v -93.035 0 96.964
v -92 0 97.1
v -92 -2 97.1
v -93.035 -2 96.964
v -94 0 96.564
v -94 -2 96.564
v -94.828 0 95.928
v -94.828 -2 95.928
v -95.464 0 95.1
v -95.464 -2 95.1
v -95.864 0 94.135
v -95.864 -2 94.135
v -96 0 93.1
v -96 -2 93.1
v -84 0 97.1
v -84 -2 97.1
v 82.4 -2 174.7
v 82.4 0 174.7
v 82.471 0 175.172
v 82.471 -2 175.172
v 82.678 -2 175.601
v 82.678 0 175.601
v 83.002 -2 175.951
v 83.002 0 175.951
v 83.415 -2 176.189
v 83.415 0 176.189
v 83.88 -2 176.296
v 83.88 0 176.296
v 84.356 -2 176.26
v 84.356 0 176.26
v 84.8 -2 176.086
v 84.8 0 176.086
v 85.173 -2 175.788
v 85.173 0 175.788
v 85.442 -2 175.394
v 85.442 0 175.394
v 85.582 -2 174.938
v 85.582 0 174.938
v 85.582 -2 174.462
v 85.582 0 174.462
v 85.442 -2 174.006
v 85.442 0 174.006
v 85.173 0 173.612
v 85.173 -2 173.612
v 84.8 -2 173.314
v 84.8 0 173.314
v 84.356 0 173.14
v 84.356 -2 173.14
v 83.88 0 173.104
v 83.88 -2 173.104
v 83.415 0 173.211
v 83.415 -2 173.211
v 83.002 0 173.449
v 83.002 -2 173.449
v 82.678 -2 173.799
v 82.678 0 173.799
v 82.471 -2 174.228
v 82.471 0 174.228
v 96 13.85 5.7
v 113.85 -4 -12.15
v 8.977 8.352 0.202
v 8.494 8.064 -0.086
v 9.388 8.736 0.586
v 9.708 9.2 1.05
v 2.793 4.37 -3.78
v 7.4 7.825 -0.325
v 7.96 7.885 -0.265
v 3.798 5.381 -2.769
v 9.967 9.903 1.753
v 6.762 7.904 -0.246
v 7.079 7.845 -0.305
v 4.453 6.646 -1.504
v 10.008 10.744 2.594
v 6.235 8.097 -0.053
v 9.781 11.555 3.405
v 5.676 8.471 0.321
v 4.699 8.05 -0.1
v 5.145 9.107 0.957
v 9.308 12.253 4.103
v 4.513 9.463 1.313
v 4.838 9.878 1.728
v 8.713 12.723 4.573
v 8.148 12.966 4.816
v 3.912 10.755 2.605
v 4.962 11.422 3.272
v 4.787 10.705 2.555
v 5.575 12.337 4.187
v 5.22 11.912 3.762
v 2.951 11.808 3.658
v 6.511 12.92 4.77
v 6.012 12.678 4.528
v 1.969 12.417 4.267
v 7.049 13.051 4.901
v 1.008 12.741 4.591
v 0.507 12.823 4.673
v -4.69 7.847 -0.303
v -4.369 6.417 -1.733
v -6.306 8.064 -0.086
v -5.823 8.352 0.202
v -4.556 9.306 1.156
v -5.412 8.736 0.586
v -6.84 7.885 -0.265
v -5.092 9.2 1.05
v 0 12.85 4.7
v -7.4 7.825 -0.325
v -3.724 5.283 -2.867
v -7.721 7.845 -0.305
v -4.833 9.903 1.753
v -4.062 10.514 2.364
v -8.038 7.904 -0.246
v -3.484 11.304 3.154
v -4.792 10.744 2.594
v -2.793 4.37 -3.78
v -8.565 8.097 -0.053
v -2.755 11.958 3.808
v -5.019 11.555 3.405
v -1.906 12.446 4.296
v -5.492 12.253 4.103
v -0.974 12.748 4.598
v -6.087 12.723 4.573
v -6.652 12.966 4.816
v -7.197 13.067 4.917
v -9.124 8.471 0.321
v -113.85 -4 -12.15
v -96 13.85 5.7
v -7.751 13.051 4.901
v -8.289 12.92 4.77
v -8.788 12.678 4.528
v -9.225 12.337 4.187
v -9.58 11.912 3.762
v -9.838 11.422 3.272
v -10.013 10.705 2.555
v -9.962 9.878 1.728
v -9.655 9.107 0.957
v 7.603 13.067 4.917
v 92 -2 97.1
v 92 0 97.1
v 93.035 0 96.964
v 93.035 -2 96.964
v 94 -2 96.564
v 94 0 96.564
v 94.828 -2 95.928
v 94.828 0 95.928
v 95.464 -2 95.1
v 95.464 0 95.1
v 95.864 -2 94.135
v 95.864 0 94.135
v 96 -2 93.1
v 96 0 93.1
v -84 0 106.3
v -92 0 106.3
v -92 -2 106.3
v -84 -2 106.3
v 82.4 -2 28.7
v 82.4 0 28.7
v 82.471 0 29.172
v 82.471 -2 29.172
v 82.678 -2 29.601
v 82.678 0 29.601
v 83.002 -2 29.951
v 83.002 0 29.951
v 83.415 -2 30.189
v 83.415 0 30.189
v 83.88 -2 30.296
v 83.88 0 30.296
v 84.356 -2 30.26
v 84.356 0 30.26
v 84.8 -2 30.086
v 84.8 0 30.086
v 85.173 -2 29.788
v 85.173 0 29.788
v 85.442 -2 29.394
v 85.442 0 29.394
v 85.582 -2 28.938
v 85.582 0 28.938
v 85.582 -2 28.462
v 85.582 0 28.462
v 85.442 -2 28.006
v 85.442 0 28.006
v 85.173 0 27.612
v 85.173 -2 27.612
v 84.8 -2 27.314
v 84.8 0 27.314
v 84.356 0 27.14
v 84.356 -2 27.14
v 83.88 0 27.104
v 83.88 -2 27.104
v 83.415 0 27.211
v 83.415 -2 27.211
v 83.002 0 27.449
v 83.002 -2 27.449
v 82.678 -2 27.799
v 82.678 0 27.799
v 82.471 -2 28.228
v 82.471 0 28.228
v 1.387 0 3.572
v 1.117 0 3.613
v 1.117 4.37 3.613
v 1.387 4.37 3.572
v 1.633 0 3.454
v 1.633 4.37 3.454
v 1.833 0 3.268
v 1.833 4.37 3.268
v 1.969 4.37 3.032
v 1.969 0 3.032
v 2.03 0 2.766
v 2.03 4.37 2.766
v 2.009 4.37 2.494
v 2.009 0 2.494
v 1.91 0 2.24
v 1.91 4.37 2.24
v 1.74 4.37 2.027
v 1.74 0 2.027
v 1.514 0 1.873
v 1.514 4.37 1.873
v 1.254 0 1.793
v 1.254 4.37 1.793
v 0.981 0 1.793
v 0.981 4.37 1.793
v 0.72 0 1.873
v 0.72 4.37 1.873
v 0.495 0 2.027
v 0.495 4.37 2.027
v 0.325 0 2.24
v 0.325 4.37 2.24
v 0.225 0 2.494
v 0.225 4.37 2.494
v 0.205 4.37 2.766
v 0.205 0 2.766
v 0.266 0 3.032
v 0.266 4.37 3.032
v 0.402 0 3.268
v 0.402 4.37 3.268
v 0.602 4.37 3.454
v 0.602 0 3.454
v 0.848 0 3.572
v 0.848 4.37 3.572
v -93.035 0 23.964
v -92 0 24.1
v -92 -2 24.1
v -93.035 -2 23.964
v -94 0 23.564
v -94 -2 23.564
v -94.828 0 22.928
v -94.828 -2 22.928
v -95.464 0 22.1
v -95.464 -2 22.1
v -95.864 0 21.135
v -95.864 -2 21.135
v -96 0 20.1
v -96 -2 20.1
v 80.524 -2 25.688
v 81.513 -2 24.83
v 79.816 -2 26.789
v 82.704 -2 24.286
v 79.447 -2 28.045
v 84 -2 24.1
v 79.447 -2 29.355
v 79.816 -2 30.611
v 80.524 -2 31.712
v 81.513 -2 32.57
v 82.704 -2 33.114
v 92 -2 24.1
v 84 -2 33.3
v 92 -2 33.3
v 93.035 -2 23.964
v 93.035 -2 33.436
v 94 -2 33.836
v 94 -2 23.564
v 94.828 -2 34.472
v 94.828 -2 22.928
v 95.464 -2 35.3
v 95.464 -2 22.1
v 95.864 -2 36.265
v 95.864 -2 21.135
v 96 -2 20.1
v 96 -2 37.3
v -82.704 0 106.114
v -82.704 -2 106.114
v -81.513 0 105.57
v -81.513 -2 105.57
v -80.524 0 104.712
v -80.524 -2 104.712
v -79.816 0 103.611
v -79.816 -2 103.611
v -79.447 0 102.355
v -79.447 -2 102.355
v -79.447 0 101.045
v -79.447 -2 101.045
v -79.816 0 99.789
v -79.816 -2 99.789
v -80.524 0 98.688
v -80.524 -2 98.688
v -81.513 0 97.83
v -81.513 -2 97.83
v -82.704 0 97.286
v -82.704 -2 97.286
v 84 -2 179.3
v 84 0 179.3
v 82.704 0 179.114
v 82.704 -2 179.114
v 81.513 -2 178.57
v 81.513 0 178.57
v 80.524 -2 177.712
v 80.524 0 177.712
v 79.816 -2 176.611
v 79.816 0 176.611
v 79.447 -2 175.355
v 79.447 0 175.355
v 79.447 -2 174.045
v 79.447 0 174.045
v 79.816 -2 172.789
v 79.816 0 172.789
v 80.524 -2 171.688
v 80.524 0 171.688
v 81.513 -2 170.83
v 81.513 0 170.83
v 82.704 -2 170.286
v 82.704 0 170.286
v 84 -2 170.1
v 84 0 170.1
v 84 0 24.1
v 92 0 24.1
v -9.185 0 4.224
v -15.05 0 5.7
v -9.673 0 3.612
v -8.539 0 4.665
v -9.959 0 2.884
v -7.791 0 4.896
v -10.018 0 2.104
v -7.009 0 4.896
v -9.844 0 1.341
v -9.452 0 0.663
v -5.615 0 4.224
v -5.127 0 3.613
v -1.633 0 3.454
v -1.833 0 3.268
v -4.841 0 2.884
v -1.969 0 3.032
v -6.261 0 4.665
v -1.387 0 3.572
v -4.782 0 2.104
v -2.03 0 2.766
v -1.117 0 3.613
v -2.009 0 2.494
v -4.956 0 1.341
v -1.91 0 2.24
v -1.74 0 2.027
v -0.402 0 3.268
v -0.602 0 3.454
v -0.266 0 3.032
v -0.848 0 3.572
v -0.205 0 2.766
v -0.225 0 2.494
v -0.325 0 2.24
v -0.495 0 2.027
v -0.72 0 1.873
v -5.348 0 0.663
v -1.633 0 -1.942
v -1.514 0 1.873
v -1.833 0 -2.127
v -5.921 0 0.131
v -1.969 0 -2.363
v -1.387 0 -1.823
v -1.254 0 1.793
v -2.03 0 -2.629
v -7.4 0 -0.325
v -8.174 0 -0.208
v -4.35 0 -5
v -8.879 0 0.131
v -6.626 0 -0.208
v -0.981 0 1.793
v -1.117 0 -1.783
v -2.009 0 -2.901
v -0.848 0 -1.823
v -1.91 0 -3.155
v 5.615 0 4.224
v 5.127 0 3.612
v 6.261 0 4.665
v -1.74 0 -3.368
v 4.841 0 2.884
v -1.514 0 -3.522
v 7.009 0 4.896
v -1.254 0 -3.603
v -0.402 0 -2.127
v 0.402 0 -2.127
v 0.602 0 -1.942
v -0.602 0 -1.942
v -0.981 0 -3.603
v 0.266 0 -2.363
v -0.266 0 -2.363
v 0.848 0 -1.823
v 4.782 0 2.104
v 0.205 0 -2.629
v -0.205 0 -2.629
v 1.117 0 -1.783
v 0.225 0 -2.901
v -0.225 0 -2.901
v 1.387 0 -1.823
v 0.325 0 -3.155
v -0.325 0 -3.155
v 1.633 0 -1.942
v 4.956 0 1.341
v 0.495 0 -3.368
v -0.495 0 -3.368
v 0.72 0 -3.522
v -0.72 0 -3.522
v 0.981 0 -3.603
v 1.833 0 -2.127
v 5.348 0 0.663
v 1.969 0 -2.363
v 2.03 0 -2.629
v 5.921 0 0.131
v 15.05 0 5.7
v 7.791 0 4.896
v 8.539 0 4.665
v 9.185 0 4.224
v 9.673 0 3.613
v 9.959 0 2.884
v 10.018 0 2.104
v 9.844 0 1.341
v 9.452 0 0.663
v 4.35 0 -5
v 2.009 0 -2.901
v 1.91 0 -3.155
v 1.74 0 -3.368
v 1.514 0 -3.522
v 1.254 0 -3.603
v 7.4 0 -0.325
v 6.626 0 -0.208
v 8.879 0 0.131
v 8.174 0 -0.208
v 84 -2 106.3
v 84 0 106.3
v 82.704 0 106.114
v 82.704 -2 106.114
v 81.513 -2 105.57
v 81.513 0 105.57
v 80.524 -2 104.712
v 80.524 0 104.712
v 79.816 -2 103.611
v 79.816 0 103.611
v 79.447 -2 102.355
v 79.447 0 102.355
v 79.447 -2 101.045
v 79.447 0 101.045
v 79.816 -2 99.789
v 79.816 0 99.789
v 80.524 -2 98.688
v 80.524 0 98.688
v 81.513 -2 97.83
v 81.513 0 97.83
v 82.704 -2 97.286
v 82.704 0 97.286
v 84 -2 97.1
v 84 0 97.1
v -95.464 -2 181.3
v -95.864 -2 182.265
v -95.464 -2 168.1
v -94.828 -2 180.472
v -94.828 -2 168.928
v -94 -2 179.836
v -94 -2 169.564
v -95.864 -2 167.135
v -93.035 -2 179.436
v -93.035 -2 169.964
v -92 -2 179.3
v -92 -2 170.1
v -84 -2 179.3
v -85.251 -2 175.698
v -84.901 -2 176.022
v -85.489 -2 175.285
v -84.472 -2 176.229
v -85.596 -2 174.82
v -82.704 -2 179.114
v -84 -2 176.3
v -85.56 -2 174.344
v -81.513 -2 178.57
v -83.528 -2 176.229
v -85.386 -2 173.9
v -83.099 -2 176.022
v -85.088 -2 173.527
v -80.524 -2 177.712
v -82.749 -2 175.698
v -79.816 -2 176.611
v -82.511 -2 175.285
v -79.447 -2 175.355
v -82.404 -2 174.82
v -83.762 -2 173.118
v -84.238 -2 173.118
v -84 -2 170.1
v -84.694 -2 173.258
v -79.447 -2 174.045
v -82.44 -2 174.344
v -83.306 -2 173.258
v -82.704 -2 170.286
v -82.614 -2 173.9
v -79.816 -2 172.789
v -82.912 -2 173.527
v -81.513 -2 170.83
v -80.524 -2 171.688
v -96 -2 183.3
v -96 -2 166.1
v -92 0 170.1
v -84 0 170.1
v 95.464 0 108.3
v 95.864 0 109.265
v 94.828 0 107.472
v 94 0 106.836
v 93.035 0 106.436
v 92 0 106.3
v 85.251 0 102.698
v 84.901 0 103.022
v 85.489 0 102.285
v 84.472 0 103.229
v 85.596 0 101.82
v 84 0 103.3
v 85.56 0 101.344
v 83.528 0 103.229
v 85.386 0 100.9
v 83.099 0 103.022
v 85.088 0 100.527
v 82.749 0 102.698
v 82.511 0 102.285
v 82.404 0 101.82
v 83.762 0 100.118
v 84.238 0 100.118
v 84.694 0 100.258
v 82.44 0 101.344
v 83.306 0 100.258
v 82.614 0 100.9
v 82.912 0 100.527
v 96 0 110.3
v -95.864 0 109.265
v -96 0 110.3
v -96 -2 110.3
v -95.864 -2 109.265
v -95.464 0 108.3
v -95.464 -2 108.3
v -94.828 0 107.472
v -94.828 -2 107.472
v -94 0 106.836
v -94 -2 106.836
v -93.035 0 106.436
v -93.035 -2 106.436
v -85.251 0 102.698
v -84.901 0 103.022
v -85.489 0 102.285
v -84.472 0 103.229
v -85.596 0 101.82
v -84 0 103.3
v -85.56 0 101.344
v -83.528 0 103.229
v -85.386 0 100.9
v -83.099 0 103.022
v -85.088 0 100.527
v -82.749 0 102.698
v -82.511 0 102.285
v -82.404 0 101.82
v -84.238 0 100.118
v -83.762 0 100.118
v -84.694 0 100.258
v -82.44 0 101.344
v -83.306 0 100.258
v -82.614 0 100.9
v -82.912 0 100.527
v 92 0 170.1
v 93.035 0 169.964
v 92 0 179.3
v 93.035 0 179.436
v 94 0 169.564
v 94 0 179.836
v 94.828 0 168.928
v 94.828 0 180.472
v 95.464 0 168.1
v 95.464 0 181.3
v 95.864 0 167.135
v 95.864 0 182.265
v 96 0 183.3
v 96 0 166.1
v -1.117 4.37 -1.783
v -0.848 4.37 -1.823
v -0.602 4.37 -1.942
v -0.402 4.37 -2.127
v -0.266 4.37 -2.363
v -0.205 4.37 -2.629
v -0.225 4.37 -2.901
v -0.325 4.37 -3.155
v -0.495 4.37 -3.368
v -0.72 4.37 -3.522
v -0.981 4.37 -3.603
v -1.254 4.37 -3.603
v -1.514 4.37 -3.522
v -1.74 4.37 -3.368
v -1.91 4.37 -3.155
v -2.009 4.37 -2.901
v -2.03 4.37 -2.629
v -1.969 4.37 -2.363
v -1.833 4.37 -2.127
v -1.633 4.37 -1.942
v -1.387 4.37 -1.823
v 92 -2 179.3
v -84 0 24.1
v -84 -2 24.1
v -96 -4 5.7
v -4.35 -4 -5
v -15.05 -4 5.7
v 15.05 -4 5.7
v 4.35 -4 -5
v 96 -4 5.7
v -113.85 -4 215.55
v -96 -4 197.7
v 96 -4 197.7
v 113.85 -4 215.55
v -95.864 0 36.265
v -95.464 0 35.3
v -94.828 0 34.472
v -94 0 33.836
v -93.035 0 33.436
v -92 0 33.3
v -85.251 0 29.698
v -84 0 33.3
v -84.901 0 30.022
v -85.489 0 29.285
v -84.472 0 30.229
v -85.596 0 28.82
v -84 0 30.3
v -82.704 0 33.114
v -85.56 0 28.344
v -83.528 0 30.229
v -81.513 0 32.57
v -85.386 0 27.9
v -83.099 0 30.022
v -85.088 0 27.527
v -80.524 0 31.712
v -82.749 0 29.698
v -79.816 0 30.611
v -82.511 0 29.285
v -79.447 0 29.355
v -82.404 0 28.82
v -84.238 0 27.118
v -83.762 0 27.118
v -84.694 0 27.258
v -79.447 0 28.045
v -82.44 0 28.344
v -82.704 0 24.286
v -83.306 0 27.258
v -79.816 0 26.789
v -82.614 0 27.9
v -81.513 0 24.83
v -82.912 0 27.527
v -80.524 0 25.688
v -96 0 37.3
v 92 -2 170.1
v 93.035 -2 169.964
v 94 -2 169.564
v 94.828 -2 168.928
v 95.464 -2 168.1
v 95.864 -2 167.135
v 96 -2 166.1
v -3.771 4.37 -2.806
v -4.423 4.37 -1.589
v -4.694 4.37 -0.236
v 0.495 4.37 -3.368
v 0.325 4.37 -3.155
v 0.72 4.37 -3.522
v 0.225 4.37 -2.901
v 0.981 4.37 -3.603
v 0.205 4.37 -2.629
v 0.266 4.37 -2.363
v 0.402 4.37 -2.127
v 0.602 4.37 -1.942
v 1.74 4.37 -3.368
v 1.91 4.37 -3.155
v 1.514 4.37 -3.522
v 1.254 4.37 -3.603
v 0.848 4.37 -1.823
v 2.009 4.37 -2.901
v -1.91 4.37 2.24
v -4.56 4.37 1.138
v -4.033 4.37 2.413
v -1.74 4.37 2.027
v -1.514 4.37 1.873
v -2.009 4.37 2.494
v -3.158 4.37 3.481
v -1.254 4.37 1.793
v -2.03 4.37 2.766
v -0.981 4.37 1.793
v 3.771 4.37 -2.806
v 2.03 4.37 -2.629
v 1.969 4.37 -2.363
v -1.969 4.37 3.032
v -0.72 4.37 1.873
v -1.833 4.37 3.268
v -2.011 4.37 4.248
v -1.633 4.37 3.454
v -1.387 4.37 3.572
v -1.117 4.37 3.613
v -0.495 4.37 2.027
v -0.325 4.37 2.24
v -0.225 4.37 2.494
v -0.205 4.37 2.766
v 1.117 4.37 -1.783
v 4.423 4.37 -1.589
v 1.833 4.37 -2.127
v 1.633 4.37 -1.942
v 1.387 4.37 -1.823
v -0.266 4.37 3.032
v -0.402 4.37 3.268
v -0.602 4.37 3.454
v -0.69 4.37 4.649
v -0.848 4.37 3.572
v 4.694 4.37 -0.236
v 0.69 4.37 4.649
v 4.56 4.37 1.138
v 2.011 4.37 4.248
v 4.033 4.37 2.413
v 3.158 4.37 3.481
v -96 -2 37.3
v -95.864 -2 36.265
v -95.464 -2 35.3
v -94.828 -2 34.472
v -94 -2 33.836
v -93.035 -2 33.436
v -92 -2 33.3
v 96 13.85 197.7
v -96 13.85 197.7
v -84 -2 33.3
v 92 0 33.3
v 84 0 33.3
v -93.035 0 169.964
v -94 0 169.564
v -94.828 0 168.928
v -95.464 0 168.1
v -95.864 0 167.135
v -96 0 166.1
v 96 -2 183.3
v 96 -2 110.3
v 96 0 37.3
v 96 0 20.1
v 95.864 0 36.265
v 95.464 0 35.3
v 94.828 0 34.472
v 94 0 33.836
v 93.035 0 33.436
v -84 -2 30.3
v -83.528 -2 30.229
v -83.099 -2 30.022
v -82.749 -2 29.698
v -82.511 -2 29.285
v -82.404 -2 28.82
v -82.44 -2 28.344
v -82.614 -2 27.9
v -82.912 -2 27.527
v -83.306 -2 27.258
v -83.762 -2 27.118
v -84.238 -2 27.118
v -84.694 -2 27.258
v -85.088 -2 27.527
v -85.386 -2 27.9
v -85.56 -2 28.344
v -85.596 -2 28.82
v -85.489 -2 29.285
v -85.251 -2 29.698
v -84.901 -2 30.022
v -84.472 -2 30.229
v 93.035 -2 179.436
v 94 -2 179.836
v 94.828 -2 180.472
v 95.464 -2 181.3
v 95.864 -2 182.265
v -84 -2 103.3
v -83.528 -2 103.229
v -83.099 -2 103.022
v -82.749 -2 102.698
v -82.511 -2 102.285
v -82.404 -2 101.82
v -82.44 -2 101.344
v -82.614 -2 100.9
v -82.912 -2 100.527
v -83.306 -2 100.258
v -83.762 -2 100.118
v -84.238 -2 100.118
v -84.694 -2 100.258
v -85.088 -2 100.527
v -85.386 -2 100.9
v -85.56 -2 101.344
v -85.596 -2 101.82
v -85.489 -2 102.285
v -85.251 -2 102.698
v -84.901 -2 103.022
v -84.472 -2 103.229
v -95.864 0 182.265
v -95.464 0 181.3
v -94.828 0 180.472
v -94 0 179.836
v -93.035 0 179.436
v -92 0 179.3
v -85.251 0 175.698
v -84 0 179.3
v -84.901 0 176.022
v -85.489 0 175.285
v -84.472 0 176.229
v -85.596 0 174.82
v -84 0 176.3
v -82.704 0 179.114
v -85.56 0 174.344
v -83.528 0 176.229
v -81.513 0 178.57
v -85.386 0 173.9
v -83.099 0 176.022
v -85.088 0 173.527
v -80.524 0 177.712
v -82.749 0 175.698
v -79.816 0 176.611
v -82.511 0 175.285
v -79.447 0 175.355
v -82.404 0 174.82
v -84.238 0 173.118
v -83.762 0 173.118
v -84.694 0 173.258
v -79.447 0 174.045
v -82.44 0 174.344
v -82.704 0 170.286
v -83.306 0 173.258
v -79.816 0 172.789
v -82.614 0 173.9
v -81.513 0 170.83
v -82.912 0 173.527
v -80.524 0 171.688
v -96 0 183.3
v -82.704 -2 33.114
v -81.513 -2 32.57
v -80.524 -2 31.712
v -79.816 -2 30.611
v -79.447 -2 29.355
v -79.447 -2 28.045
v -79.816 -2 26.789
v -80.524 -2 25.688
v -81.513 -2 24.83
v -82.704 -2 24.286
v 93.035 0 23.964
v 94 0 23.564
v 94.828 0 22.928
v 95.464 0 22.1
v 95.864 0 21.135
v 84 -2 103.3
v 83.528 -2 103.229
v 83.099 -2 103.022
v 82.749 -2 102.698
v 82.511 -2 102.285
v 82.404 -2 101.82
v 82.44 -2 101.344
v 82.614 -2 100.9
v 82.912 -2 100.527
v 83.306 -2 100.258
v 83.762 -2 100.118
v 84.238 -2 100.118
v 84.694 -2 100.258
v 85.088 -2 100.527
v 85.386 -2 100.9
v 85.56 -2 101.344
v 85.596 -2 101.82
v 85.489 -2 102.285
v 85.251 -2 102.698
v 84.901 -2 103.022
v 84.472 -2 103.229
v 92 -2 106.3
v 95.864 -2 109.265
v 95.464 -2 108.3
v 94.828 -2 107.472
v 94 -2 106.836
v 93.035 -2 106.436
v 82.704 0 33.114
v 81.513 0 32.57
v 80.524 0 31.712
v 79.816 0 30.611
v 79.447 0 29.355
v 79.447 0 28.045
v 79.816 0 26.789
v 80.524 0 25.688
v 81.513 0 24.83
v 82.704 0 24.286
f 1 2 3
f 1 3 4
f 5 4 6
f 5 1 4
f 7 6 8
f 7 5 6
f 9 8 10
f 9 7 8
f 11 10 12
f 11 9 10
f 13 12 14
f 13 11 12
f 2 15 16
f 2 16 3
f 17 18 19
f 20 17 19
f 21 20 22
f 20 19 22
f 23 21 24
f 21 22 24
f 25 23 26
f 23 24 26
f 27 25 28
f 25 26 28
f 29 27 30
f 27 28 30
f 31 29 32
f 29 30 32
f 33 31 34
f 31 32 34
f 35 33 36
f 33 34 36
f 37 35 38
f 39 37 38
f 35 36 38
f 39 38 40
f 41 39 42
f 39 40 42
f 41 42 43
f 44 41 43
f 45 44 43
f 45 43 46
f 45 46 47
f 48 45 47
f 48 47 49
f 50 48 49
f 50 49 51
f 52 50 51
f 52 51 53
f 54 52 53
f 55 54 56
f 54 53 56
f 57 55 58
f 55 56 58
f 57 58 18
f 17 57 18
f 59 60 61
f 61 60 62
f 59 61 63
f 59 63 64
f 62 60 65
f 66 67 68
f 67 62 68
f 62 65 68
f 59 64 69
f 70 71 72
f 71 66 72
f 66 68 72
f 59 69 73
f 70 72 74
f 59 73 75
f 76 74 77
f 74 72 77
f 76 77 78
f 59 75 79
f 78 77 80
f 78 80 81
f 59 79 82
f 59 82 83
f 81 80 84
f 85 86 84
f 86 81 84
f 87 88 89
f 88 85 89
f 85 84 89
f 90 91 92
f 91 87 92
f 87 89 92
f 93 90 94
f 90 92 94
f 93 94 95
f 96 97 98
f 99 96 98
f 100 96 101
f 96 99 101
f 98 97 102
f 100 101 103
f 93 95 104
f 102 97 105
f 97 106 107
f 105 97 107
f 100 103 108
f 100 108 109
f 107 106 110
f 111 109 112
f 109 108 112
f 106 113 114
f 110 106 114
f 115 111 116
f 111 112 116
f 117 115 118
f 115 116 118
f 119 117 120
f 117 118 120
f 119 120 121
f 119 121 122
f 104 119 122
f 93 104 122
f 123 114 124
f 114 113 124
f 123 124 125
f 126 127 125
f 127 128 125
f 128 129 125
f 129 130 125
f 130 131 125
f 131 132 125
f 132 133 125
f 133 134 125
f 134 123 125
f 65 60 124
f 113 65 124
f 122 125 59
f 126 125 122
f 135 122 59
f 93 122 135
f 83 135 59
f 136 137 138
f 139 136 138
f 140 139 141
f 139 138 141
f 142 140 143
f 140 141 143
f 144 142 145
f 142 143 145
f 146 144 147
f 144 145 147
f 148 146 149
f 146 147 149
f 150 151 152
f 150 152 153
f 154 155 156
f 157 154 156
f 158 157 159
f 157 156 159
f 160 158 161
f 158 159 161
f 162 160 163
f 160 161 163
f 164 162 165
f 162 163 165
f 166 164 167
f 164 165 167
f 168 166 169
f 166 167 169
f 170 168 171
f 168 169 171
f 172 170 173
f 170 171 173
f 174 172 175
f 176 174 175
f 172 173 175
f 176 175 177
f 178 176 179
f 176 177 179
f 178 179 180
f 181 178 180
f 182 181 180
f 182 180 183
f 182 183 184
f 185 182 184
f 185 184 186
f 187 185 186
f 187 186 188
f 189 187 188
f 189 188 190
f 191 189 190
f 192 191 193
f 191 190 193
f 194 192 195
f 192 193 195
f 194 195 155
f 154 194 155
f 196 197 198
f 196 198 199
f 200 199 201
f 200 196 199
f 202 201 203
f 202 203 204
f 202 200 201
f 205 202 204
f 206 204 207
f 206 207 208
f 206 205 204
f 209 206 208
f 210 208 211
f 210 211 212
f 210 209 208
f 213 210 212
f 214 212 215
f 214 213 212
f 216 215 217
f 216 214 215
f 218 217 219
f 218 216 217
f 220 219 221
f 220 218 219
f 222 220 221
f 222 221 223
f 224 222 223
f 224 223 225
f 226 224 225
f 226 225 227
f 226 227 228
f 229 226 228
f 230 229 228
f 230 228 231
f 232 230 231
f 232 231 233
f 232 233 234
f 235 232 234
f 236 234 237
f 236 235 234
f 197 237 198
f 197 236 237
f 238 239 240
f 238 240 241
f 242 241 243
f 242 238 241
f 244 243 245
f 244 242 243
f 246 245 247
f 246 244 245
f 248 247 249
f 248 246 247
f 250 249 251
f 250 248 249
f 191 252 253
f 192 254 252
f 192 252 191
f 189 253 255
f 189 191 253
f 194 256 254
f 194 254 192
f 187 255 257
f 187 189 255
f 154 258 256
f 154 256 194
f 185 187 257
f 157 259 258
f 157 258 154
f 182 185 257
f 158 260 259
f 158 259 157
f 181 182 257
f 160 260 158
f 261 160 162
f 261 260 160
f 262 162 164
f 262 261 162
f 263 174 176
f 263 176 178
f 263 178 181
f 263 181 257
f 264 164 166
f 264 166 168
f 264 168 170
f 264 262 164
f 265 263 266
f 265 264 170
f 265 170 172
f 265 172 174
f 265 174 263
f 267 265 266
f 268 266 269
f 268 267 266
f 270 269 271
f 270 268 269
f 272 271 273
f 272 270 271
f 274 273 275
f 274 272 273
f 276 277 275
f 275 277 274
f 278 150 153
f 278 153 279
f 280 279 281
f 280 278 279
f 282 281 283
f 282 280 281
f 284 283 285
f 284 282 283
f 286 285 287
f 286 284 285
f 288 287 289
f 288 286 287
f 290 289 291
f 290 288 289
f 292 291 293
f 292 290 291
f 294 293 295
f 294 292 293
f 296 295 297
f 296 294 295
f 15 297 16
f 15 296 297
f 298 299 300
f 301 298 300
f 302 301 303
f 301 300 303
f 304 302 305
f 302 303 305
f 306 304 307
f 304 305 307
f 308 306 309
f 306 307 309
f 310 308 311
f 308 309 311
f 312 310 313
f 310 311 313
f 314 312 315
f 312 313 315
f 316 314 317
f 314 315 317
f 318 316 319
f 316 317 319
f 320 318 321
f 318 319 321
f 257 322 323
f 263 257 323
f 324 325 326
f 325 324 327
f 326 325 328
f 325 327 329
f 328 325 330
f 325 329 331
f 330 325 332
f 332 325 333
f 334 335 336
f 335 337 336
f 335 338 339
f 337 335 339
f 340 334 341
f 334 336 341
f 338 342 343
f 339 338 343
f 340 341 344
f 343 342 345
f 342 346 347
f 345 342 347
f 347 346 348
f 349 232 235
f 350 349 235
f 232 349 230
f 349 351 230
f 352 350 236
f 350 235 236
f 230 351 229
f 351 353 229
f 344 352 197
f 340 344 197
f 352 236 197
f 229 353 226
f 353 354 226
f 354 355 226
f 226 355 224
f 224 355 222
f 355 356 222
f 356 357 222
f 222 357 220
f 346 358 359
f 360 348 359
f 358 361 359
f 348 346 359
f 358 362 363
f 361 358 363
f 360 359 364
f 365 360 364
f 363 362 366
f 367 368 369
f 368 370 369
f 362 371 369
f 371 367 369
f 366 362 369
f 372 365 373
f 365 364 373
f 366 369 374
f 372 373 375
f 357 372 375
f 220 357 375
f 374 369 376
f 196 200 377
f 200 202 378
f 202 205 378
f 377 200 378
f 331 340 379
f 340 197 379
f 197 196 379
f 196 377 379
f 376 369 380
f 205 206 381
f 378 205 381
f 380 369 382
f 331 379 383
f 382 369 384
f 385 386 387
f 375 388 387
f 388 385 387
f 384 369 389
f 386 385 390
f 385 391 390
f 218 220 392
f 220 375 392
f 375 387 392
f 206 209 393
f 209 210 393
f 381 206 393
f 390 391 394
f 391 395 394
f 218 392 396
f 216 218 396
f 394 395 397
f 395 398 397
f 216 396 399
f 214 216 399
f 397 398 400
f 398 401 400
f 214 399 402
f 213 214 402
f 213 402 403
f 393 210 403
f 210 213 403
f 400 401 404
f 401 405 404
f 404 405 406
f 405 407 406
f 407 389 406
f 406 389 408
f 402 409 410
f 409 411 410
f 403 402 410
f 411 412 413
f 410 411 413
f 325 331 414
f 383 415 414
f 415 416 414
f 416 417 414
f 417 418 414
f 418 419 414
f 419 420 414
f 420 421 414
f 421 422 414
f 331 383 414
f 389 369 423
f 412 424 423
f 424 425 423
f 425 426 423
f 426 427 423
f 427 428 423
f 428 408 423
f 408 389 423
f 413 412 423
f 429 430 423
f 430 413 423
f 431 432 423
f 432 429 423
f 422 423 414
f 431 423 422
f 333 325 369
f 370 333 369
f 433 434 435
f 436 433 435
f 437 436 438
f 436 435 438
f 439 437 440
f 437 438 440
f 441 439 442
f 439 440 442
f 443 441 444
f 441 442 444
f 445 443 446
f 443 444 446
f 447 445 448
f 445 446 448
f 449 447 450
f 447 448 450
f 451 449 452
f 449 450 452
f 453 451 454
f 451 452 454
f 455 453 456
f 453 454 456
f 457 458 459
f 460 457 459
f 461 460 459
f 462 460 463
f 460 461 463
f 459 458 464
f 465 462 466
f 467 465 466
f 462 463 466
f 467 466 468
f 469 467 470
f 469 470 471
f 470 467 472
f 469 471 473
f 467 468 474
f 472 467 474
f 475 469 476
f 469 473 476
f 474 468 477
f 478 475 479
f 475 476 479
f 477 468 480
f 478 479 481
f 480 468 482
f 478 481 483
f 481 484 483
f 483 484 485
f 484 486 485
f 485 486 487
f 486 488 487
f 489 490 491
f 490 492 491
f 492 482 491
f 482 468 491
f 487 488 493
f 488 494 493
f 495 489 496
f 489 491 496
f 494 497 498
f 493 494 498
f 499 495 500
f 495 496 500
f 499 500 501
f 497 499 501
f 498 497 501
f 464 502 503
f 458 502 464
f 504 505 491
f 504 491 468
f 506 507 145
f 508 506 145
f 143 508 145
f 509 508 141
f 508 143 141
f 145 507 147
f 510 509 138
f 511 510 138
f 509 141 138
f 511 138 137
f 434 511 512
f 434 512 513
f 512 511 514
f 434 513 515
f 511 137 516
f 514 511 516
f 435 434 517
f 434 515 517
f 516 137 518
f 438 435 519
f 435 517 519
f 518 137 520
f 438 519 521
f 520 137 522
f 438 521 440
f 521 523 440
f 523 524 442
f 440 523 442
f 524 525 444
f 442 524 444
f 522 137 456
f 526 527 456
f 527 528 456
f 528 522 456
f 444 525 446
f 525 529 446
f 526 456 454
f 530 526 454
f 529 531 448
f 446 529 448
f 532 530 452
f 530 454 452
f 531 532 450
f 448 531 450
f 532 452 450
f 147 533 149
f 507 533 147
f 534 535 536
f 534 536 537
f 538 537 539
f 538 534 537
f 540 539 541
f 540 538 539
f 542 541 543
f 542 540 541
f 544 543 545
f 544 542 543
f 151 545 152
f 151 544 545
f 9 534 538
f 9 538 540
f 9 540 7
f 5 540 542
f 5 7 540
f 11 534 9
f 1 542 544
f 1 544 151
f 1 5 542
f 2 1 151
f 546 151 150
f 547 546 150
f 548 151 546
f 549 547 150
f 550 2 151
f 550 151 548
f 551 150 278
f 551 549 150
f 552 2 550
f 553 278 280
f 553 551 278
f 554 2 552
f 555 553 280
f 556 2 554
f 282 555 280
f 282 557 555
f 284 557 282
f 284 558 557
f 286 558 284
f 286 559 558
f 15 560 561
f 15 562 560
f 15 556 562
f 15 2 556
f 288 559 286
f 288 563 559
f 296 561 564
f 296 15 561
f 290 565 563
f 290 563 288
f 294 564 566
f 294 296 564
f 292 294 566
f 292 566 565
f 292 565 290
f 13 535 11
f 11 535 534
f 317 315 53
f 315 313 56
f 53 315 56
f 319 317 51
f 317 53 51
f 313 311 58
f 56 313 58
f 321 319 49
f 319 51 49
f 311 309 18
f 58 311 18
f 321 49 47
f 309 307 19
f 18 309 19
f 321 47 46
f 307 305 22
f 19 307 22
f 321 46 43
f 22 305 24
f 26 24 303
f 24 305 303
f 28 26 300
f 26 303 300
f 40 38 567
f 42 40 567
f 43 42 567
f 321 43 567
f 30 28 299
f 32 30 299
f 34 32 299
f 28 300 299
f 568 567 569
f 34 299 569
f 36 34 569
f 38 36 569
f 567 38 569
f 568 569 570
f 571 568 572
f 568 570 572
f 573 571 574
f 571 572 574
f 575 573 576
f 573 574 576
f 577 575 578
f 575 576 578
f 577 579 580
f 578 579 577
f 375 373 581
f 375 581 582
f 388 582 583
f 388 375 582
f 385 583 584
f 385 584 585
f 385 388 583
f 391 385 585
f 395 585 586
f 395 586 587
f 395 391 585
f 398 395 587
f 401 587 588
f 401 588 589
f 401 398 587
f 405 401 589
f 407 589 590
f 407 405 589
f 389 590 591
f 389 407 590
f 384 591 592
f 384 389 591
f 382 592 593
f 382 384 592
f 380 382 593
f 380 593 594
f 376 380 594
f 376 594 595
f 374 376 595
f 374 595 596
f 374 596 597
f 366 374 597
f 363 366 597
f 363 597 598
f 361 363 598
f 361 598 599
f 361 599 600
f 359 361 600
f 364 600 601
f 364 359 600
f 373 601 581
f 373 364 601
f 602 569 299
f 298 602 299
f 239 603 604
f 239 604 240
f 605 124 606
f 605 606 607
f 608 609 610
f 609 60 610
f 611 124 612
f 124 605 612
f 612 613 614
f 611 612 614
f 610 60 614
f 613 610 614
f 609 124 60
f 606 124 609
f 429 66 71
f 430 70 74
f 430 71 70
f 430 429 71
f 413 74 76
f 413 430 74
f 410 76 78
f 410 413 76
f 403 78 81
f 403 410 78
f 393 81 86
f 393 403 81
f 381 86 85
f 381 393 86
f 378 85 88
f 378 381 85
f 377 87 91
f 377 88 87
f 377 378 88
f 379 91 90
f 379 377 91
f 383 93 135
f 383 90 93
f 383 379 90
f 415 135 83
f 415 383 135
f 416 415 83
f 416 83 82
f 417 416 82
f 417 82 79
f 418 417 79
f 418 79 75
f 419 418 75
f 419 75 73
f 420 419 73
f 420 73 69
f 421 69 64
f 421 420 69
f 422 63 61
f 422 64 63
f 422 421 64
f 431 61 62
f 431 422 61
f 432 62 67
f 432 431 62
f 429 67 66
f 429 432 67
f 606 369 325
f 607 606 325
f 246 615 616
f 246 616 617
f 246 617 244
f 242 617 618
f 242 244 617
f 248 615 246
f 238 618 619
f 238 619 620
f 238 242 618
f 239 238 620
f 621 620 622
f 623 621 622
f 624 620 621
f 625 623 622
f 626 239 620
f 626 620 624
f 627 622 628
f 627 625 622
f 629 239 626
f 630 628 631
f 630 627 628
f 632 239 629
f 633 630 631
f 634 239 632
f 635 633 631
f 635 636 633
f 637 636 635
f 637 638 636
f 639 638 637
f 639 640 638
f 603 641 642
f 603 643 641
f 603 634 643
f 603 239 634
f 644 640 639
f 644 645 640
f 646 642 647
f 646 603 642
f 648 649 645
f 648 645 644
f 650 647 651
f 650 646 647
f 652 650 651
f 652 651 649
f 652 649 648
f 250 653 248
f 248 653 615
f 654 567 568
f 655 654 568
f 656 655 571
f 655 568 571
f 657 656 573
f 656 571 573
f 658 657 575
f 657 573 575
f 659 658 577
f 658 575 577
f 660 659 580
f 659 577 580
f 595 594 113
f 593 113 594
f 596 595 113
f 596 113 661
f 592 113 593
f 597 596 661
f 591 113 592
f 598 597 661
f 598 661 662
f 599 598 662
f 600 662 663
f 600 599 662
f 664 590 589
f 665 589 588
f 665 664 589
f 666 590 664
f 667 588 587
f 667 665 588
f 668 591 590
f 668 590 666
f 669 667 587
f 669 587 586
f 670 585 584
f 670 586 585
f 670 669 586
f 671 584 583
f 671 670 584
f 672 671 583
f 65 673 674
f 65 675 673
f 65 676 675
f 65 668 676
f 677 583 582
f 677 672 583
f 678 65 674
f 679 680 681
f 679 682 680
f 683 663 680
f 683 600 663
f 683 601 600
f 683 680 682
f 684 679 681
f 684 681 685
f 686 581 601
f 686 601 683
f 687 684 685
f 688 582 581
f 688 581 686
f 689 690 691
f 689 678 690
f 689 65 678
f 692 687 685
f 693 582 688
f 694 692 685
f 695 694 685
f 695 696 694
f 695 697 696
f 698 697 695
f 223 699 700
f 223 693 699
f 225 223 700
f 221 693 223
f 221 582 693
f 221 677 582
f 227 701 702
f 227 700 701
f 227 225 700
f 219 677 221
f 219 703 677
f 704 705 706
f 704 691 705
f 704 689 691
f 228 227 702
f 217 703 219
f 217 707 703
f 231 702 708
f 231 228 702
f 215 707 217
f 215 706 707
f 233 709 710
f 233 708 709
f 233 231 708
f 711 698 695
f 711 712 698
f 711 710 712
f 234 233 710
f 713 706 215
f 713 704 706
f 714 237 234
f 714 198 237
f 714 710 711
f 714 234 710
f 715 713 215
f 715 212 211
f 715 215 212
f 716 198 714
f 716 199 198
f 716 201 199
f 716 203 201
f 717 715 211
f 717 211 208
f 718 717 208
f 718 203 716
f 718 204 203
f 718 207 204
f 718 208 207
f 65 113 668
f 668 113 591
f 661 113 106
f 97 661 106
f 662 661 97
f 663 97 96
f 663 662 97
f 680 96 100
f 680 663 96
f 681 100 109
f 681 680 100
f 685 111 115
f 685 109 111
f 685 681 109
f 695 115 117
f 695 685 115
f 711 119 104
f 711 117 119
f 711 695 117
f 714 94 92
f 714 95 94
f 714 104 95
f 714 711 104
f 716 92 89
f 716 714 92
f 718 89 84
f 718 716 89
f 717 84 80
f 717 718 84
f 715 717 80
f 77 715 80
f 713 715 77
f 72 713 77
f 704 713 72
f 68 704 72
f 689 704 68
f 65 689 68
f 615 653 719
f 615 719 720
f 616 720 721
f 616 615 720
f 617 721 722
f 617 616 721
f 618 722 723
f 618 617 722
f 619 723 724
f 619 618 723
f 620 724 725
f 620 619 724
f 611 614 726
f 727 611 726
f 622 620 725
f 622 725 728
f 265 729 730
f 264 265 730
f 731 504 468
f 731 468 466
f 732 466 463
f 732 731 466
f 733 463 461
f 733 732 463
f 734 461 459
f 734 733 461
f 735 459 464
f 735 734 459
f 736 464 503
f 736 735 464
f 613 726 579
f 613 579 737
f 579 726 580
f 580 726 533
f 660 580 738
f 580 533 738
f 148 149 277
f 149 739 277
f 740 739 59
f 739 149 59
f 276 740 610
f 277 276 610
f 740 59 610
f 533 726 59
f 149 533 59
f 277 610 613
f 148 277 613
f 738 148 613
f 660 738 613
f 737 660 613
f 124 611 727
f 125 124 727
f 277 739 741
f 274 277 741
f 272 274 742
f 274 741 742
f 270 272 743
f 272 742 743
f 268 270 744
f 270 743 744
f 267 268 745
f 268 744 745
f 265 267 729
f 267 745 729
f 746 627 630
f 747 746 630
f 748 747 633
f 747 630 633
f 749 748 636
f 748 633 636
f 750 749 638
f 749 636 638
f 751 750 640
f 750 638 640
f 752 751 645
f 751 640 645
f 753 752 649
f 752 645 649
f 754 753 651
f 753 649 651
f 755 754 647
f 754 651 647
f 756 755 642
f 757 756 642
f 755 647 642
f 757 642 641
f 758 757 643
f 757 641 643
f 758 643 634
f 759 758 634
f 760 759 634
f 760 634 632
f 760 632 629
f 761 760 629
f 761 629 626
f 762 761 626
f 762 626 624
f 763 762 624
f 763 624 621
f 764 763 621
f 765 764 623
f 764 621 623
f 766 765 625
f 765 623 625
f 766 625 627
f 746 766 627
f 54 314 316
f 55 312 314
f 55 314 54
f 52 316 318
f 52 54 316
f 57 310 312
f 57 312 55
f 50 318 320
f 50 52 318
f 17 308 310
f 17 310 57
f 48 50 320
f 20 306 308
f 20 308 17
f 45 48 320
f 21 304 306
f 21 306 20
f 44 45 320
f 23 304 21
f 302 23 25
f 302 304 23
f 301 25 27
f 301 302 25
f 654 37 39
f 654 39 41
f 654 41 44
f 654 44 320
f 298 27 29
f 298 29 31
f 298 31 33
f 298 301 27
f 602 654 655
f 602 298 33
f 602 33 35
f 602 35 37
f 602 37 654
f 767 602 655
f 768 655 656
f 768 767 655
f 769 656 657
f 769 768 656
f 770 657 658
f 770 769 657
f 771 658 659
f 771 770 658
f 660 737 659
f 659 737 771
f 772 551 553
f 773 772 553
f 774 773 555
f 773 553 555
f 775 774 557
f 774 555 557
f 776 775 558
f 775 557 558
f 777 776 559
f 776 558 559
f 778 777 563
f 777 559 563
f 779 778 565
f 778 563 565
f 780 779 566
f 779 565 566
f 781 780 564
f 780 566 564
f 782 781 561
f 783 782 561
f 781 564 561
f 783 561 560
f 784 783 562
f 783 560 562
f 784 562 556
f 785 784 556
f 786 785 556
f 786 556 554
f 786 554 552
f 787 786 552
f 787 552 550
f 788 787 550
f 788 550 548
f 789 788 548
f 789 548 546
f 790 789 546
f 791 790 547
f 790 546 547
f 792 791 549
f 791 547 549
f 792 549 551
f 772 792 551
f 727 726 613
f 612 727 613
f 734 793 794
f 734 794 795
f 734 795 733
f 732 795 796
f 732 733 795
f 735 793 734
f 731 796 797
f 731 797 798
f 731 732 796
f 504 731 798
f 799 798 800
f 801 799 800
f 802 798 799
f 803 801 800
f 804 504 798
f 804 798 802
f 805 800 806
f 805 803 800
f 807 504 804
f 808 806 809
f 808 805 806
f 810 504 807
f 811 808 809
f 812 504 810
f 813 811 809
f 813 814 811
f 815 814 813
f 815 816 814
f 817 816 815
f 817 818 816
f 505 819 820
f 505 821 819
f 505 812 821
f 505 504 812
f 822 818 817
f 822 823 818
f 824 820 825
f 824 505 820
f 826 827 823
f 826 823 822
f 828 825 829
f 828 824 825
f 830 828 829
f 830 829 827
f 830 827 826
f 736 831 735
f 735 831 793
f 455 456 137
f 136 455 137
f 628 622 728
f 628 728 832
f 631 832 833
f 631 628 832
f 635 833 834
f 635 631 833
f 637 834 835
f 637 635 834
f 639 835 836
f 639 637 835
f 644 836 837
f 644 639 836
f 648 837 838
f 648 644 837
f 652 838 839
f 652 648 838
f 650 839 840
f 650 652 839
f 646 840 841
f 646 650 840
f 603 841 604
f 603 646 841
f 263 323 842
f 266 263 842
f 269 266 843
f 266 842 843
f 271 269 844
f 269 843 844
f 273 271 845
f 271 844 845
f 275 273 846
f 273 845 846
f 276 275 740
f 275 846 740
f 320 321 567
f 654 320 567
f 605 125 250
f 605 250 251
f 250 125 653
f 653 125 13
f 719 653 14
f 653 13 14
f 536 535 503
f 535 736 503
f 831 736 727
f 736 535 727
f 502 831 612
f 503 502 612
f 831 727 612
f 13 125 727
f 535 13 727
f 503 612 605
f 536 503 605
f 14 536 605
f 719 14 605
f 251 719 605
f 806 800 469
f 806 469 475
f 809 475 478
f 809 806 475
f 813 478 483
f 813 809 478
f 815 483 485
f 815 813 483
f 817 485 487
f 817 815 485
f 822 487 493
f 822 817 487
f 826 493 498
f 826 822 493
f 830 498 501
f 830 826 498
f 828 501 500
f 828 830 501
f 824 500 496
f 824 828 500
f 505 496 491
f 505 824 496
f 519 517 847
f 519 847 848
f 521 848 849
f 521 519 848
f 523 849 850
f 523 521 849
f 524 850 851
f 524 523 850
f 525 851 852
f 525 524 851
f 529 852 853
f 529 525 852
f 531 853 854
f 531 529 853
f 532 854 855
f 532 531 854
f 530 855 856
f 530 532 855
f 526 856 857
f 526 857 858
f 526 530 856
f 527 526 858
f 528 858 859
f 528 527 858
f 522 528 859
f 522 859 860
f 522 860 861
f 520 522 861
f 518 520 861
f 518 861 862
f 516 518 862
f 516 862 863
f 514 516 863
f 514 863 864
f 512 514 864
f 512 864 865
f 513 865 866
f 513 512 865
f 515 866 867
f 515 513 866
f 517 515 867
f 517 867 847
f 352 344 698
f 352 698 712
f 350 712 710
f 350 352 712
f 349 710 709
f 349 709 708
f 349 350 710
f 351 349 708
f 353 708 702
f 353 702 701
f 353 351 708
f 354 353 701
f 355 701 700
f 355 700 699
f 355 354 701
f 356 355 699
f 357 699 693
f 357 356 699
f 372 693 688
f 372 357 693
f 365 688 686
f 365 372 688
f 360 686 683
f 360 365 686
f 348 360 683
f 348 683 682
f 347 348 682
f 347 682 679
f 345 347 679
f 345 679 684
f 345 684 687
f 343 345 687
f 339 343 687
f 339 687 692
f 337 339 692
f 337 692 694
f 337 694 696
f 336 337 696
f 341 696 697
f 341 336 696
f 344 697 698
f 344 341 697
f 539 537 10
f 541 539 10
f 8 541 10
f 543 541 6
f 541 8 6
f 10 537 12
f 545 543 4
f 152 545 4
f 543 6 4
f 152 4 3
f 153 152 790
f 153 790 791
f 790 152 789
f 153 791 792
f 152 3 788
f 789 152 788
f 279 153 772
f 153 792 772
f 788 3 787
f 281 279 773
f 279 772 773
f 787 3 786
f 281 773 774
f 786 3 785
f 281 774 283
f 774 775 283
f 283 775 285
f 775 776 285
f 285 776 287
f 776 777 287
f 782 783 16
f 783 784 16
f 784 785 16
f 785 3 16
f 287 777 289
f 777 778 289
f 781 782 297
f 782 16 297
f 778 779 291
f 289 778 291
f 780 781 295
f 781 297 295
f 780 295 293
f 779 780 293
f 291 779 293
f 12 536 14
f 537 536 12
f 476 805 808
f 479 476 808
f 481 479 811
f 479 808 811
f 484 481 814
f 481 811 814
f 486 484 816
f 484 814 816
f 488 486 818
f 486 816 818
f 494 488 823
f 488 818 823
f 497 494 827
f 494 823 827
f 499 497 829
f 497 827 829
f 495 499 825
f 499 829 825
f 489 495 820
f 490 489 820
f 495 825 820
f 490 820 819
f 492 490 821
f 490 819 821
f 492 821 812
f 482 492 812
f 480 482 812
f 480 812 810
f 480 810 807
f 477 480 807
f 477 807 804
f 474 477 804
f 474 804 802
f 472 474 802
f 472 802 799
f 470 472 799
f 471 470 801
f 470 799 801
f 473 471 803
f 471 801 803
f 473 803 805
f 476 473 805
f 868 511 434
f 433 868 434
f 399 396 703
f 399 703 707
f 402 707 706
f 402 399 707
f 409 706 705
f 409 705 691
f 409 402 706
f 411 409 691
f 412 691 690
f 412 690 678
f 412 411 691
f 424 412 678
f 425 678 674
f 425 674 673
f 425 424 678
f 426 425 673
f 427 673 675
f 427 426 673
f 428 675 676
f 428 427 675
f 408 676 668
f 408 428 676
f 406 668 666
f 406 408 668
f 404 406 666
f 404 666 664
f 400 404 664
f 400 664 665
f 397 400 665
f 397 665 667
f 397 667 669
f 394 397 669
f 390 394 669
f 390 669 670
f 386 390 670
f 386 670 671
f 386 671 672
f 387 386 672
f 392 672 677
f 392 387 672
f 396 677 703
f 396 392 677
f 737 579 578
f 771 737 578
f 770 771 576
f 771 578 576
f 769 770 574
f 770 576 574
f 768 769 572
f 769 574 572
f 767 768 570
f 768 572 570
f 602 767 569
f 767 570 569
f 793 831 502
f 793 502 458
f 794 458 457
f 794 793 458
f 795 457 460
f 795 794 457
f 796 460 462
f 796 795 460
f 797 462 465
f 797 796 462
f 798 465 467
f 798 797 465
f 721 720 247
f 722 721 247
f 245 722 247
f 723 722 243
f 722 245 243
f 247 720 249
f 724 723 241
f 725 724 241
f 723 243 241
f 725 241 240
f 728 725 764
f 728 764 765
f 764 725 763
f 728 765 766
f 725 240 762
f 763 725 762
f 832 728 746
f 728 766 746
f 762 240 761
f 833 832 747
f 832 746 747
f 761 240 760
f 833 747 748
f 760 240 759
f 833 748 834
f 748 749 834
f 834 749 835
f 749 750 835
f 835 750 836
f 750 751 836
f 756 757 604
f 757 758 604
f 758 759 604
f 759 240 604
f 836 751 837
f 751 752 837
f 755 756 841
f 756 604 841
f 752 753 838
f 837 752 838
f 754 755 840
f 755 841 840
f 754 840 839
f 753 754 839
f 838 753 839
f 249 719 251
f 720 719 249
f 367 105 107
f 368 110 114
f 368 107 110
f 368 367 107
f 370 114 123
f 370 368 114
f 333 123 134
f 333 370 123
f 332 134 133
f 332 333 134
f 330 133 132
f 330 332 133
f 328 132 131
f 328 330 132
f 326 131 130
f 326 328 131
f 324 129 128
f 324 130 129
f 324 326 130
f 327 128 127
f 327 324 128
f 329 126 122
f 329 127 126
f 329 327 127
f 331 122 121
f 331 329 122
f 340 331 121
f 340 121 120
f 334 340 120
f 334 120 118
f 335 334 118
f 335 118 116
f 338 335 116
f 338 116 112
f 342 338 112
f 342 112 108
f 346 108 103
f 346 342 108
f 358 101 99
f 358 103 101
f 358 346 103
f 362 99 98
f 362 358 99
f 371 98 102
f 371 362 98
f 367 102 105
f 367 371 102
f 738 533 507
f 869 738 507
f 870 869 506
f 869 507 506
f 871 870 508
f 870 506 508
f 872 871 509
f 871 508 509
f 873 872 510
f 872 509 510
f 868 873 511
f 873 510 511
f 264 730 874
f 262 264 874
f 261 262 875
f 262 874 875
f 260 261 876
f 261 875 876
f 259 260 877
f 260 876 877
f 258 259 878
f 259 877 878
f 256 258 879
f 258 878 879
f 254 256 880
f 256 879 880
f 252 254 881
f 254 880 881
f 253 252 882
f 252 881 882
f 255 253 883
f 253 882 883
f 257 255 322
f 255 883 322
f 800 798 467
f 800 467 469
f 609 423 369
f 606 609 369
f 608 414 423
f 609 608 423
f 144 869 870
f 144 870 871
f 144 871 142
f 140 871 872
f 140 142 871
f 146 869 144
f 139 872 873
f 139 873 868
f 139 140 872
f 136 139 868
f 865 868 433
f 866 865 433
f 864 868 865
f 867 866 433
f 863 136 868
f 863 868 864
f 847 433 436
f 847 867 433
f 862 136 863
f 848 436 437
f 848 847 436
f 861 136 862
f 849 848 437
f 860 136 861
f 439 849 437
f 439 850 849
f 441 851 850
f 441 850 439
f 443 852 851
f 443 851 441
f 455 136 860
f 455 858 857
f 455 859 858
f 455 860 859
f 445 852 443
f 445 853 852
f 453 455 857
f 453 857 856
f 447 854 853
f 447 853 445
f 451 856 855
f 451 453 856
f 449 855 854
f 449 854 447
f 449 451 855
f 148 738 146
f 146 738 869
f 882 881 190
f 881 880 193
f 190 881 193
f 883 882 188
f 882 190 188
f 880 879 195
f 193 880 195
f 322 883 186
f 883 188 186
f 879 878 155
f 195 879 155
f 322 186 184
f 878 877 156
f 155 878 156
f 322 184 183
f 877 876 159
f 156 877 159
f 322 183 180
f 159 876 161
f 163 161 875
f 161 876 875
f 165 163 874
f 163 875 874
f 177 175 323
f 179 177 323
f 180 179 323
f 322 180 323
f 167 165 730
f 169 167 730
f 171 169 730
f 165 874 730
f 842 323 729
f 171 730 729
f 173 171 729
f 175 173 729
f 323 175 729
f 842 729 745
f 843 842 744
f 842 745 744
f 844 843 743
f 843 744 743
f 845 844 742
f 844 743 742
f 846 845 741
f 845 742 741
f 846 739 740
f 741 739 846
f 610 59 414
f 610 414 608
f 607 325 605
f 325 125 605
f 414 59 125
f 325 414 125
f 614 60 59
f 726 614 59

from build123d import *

# Parameters (mm, degrees)
SKETCH1_R               = 0.915
BOSS_EXTRUDE1_DEPTH     = 4.37
BOSS_EXTRUDE1_2_DEPTH   = 4.37
BOSS_EXTRUDE1_3_DEPTH   = 4.37
BOSS_EXTRUDE1_4_DEPTH   = 4.37
BOSS_EXTRUDE2_START     = 4.37
SKETCH1_3_R             = 4.7
SKETCH1_3_R_2           = 0.915
BOSS_EXTRUDE2_DEPTH     = 15
CUT_EXTRUDE1_DEPTH      = 245.162747978
SKETCH1_6_R             = 2.625
SKETCH1_6_R_2           = 0.75
CUT_EXTRUDE4_DEPTH      = 245.162747978
SKETCH5_R               = 1.6
BOSS_EXTRUDE4_DEPTH     = 2
LPATTERN1_COUNT         = 2
LPATTERN1_PITCH         = 73
LPATTERN1_COL_COUNT     = 2
LPATTERN1_COL_PITCH     = 73
MIRROR1_COPY_1_SKETCH_R = 1.6
MIRROR1_COPY_1_DEPTH    = 2
MIRROR1_COPY_2_SKETCH_R = 1.6
MIRROR1_COPY_2_DEPTH    = 2


with BuildPart() as part:
    # Sketch1 → Boss-Extrude1 (new body)
    with BuildSketch(Plane(origin=(0, 0, 0), x_dir=(1, 0, 0), z_dir=(0, 1, 0))):
        with Locations(Location((-1.117435623, 2.697728235, 0), (0, 0, 270))):
            Circle(SKETCH1_R)
    extrude(amount=BOSS_EXTRUDE1_DEPTH)



with BuildPart() as body_2:
    # Sketch1 → Boss-Extrude1 2 (new body)
    with BuildSketch(Plane(origin=(0, 0, 0), x_dir=(1, 0, 0), z_dir=(0, 1, 0))):
        with Locations(Location((-1.117435623, -2.697728235, 0), (0, 0, 270))):
            Circle(SKETCH1_R)
    extrude(amount=BOSS_EXTRUDE1_2_DEPTH)


with BuildPart() as body_3:
    # Sketch1 → Boss-Extrude1 3 (new body)
    with BuildSketch(Plane(origin=(0, 0, 0), x_dir=(1, 0, 0), z_dir=(0, 1, 0))):
        with Locations(Location((1.117435623, 2.697728235, 0), (0, 0, 270))):
            Circle(SKETCH1_R)
    extrude(amount=BOSS_EXTRUDE1_3_DEPTH)


with BuildPart() as body_4:
    # Sketch1 → Boss-Extrude1 4 (new body)
    with BuildSketch(Plane(origin=(0, 0, 0), x_dir=(1, 0, 0), z_dir=(0, 1, 0))):
        with Locations(Location((1.117435623, -2.697728235, 0), (0, 0, 270))):
            Circle(SKETCH1_R)
    extrude(amount=BOSS_EXTRUDE1_4_DEPTH)


with BuildPart() as part_1:
    add(part.part)

    add(body_2.part)  # Boss-Extrude2 merges body 2

    add(body_3.part)  # Boss-Extrude2 merges body 3

    add(body_4.part)  # Boss-Extrude2 merges body 4
    # Sketch1<3> → Boss-Extrude2 (add)
    # profile 1 of 5: a face of its own
    with BuildSketch(Plane(origin=(0, 0, 0), x_dir=(1, 0, 0), z_dir=(0, 1, 0)).offset(BOSS_EXTRUDE2_START)):
        with Locations(Location((0, 0, 0), (0, 0, 270))):
            Circle(SKETCH1_3_R)
        with Locations(Location((-1.117435623, -2.697728235, 0), (0, 0, 270))):
            Circle(SKETCH1_3_R_2, mode=Mode.SUBTRACT)
        with Locations(Location((1.117435623, -2.697728235, 0), (0, 0, 270))):
            Circle(SKETCH1_3_R_2, mode=Mode.SUBTRACT)
        with Locations(Location((1.117435623, 2.697728235, 0), (0, 0, 270))):
            Circle(SKETCH1_3_R_2, mode=Mode.SUBTRACT)
        with Locations(Location((-1.117435623, 2.697728235, 0), (0, 0, 270))):
            Circle(SKETCH1_3_R_2, mode=Mode.SUBTRACT)
    # profile 2 of 5: a face of its own
    with BuildSketch(Plane(origin=(0, 0, 0), x_dir=(1, 0, 0), z_dir=(0, 1, 0)).offset(BOSS_EXTRUDE2_START)):
        with Locations(Location((-1.117435623, -2.697728235, 0), (0, 0, 270))):
            Circle(SKETCH1_3_R_2)
    # profile 3 of 5: a face of its own
    with BuildSketch(Plane(origin=(0, 0, 0), x_dir=(1, 0, 0), z_dir=(0, 1, 0)).offset(BOSS_EXTRUDE2_START)):
        with Locations(Location((1.117435623, -2.697728235, 0), (0, 0, 270))):
            Circle(SKETCH1_3_R_2)
    # profile 4 of 5: a face of its own
    with BuildSketch(Plane(origin=(0, 0, 0), x_dir=(1, 0, 0), z_dir=(0, 1, 0)).offset(BOSS_EXTRUDE2_START)):
        with Locations(Location((1.117435623, 2.697728235, 0), (0, 0, 270))):
            Circle(SKETCH1_3_R_2)
    # profile 5 of 5: a face of its own
    with BuildSketch(Plane(origin=(0, 0, 0), x_dir=(1, 0, 0), z_dir=(0, 1, 0)).offset(BOSS_EXTRUDE2_START)):
        with Locations(Location((-1.117435623, 2.697728235, 0), (0, 0, 270))):
            Circle(SKETCH1_3_R_2)
    extrude(amount=BOSS_EXTRUDE2_DEPTH)


with BuildPart() as body_2_2:
    # Sweep1: sweep along a path in Sketch4
    with BuildLine(Plane(origin=(0, 0, 0), x_dir=(1, 0, 0), z_dir=(0, 1, 0))) as sweep1_path:
        Line((-96, -197.7), (96, -197.7))
        Line((96, -197.7), (96, -5.7))
        Line((96, -5.7), (-96, -5.7))
        Line((-96, -5.7), (-96, -197.7))
    # Sketch2 → Sweep1 (sweep)
    with BuildSketch(Plane(origin=(0, 0, 0), x_dir=(0, 0, -1), z_dir=(1, 0, 0))):
        Polygon((-5.7, -4), (-5.7, 13.85), (12.15, -4), align=None)
    sweep(path=sweep1_path.line, transition=Transition.RIGHT)

    # Combine2: cut part
    add(part_1.part, mode=Mode.SUBTRACT)

    # Sketch3 → Cut-Extrude1 (cut, through all)
    with BuildSketch(Plane(origin=(0, 0, 0), x_dir=(1, 0, 0), z_dir=(0, 1, 0))):
        Polygon((-15.05, -5.7), (15.05, -5.7), (4.35, 5), (-4.35, 5), align=None)
    extrude(amount=-CUT_EXTRUDE1_DEPTH, mode=Mode.SUBTRACT)

    # Sketch1<6> → Cut-Extrude4 (cut, through all)
    # profile 1 of 4: a face of its own
    with BuildSketch(Plane(origin=(0, 0, 0), x_dir=(1, 0, 0), z_dir=(0, 1, 0))):
        with Locations(Location((-7.4, -2.3, 0), (0, 0, 90))):
            Circle(SKETCH1_6_R)
    # profile 2 of 4: a face of its own
    with BuildSketch(Plane(origin=(0, 0, 0), x_dir=(1, 0, 0), z_dir=(0, 1, 0))):
        with Locations(Location((7.4, -2.3, 0), (0, 0, 90))):
            Circle(SKETCH1_6_R)
        with Locations((8.9, -2.3)):
            Circle(SKETCH1_6_R_2, mode=Mode.SUBTRACT)
        with Locations((5.9, -2.3)):
            Circle(SKETCH1_6_R_2, mode=Mode.SUBTRACT)
    # profile 3 of 4: a face of its own
    with BuildSketch(Plane(origin=(0, 0, 0), x_dir=(1, 0, 0), z_dir=(0, 1, 0))):
        with Locations((5.9, -2.3)):
            Circle(SKETCH1_6_R_2)
    # profile 4 of 4: a face of its own
    with BuildSketch(Plane(origin=(0, 0, 0), x_dir=(1, 0, 0), z_dir=(0, 1, 0))):
        with Locations((8.9, -2.3)):
            Circle(SKETCH1_6_R_2)
    extrude(amount=CUT_EXTRUDE4_DEPTH, mode=Mode.SUBTRACT)

    # Sketch5 → Boss-Extrude4 (add)
    with BuildSketch(Plane(origin=(0, 0, 0), x_dir=(1, 0, 0), z_dir=(0, 1, 0))):
        with BuildLine():
            ThreePointArc((-84, -106.3), (-79.4, -101.7), (-84, -97.1))
            Line((-84, -97.1), (-92, -97.1))
            ThreePointArc((-92, -97.1), (-94.828427125, -95.928427125), (-96, -93.1))
            Line((-96, -93.1), (-96, -110.3))
            ThreePointArc((-96, -110.3), (-94.828427125, -107.471572875), (-92, -106.3))
            Line((-92, -106.3), (-84, -106.3))
        make_face()
        with Locations(Location((-84, -101.7, 0), (0, 0, 270))):
            Circle(SKETCH5_R, mode=Mode.SUBTRACT)
    boss_extrude4 = extrude(amount=-BOSS_EXTRUDE4_DEPTH)

    # LPattern1: Boss-Extrude4 ×2
    with Locations(*[(0, 0, -i * LPATTERN1_PITCH) for i in range(1, LPATTERN1_COUNT)]):
        add(boss_extrude4)

    # LPattern1 col: Boss-Extrude4 ×2
    with Locations(*[(0, 0, i * LPATTERN1_COL_PITCH) for i in range(1, LPATTERN1_COL_COUNT)]):
        add(boss_extrude4)

    # Mirror1: Boss-Extrude4 across plane
    add(boss_extrude4.mirror(Plane(origin=(0, 0, 0), x_dir=(0, 0, 1), z_dir=(1, 0, 0))))

    # Mirror1 copy 1 sketch → Mirror1 copy 1 (add)
    with BuildSketch(Plane(origin=(0, 0, -73), x_dir=(-1, 0, 0), z_dir=(0, 1, 0))):
        with BuildLine():
            ThreePointArc((-84, 106.3), (-79.4, 101.7), (-84, 97.1))
            Line((-84, 97.1), (-92, 97.1))
            ThreePointArc((-92, 97.1), (-94.828427125, 95.928427125), (-96, 93.1))
            Line((-96, 93.1), (-96, 110.3))
            ThreePointArc((-96, 110.3), (-94.828427125, 107.471572875), (-92, 106.3))
            Line((-92, 106.3), (-84, 106.3))
        make_face()
        with Locations((-84, 101.7)):
            Circle(MIRROR1_COPY_1_SKETCH_R, mode=Mode.SUBTRACT)
    extrude(amount=-MIRROR1_COPY_1_DEPTH)

    # Mirror1 copy 2 sketch → Mirror1 copy 2 (add)
    with BuildSketch(Plane(origin=(0, 0, 73), x_dir=(-1, 0, 0), z_dir=(0, 1, 0))):
        with BuildLine():
            ThreePointArc((-84, 106.3), (-79.4, 101.7), (-84, 97.1))
            Line((-84, 97.1), (-92, 97.1))
            ThreePointArc((-92, 97.1), (-94.828427125, 95.928427125), (-96, 93.1))
            Line((-96, 93.1), (-96, 110.3))
            ThreePointArc((-96, 110.3), (-94.828427125, 107.471572875), (-92, 106.3))
            Line((-92, 106.3), (-84, 106.3))
        make_face()
        with Locations((-84, 101.7)):
            Circle(MIRROR1_COPY_2_SKETCH_R, mode=Mode.SUBTRACT)
    extrude(amount=-MIRROR1_COPY_2_DEPTH)


solid = body_2_2.part
